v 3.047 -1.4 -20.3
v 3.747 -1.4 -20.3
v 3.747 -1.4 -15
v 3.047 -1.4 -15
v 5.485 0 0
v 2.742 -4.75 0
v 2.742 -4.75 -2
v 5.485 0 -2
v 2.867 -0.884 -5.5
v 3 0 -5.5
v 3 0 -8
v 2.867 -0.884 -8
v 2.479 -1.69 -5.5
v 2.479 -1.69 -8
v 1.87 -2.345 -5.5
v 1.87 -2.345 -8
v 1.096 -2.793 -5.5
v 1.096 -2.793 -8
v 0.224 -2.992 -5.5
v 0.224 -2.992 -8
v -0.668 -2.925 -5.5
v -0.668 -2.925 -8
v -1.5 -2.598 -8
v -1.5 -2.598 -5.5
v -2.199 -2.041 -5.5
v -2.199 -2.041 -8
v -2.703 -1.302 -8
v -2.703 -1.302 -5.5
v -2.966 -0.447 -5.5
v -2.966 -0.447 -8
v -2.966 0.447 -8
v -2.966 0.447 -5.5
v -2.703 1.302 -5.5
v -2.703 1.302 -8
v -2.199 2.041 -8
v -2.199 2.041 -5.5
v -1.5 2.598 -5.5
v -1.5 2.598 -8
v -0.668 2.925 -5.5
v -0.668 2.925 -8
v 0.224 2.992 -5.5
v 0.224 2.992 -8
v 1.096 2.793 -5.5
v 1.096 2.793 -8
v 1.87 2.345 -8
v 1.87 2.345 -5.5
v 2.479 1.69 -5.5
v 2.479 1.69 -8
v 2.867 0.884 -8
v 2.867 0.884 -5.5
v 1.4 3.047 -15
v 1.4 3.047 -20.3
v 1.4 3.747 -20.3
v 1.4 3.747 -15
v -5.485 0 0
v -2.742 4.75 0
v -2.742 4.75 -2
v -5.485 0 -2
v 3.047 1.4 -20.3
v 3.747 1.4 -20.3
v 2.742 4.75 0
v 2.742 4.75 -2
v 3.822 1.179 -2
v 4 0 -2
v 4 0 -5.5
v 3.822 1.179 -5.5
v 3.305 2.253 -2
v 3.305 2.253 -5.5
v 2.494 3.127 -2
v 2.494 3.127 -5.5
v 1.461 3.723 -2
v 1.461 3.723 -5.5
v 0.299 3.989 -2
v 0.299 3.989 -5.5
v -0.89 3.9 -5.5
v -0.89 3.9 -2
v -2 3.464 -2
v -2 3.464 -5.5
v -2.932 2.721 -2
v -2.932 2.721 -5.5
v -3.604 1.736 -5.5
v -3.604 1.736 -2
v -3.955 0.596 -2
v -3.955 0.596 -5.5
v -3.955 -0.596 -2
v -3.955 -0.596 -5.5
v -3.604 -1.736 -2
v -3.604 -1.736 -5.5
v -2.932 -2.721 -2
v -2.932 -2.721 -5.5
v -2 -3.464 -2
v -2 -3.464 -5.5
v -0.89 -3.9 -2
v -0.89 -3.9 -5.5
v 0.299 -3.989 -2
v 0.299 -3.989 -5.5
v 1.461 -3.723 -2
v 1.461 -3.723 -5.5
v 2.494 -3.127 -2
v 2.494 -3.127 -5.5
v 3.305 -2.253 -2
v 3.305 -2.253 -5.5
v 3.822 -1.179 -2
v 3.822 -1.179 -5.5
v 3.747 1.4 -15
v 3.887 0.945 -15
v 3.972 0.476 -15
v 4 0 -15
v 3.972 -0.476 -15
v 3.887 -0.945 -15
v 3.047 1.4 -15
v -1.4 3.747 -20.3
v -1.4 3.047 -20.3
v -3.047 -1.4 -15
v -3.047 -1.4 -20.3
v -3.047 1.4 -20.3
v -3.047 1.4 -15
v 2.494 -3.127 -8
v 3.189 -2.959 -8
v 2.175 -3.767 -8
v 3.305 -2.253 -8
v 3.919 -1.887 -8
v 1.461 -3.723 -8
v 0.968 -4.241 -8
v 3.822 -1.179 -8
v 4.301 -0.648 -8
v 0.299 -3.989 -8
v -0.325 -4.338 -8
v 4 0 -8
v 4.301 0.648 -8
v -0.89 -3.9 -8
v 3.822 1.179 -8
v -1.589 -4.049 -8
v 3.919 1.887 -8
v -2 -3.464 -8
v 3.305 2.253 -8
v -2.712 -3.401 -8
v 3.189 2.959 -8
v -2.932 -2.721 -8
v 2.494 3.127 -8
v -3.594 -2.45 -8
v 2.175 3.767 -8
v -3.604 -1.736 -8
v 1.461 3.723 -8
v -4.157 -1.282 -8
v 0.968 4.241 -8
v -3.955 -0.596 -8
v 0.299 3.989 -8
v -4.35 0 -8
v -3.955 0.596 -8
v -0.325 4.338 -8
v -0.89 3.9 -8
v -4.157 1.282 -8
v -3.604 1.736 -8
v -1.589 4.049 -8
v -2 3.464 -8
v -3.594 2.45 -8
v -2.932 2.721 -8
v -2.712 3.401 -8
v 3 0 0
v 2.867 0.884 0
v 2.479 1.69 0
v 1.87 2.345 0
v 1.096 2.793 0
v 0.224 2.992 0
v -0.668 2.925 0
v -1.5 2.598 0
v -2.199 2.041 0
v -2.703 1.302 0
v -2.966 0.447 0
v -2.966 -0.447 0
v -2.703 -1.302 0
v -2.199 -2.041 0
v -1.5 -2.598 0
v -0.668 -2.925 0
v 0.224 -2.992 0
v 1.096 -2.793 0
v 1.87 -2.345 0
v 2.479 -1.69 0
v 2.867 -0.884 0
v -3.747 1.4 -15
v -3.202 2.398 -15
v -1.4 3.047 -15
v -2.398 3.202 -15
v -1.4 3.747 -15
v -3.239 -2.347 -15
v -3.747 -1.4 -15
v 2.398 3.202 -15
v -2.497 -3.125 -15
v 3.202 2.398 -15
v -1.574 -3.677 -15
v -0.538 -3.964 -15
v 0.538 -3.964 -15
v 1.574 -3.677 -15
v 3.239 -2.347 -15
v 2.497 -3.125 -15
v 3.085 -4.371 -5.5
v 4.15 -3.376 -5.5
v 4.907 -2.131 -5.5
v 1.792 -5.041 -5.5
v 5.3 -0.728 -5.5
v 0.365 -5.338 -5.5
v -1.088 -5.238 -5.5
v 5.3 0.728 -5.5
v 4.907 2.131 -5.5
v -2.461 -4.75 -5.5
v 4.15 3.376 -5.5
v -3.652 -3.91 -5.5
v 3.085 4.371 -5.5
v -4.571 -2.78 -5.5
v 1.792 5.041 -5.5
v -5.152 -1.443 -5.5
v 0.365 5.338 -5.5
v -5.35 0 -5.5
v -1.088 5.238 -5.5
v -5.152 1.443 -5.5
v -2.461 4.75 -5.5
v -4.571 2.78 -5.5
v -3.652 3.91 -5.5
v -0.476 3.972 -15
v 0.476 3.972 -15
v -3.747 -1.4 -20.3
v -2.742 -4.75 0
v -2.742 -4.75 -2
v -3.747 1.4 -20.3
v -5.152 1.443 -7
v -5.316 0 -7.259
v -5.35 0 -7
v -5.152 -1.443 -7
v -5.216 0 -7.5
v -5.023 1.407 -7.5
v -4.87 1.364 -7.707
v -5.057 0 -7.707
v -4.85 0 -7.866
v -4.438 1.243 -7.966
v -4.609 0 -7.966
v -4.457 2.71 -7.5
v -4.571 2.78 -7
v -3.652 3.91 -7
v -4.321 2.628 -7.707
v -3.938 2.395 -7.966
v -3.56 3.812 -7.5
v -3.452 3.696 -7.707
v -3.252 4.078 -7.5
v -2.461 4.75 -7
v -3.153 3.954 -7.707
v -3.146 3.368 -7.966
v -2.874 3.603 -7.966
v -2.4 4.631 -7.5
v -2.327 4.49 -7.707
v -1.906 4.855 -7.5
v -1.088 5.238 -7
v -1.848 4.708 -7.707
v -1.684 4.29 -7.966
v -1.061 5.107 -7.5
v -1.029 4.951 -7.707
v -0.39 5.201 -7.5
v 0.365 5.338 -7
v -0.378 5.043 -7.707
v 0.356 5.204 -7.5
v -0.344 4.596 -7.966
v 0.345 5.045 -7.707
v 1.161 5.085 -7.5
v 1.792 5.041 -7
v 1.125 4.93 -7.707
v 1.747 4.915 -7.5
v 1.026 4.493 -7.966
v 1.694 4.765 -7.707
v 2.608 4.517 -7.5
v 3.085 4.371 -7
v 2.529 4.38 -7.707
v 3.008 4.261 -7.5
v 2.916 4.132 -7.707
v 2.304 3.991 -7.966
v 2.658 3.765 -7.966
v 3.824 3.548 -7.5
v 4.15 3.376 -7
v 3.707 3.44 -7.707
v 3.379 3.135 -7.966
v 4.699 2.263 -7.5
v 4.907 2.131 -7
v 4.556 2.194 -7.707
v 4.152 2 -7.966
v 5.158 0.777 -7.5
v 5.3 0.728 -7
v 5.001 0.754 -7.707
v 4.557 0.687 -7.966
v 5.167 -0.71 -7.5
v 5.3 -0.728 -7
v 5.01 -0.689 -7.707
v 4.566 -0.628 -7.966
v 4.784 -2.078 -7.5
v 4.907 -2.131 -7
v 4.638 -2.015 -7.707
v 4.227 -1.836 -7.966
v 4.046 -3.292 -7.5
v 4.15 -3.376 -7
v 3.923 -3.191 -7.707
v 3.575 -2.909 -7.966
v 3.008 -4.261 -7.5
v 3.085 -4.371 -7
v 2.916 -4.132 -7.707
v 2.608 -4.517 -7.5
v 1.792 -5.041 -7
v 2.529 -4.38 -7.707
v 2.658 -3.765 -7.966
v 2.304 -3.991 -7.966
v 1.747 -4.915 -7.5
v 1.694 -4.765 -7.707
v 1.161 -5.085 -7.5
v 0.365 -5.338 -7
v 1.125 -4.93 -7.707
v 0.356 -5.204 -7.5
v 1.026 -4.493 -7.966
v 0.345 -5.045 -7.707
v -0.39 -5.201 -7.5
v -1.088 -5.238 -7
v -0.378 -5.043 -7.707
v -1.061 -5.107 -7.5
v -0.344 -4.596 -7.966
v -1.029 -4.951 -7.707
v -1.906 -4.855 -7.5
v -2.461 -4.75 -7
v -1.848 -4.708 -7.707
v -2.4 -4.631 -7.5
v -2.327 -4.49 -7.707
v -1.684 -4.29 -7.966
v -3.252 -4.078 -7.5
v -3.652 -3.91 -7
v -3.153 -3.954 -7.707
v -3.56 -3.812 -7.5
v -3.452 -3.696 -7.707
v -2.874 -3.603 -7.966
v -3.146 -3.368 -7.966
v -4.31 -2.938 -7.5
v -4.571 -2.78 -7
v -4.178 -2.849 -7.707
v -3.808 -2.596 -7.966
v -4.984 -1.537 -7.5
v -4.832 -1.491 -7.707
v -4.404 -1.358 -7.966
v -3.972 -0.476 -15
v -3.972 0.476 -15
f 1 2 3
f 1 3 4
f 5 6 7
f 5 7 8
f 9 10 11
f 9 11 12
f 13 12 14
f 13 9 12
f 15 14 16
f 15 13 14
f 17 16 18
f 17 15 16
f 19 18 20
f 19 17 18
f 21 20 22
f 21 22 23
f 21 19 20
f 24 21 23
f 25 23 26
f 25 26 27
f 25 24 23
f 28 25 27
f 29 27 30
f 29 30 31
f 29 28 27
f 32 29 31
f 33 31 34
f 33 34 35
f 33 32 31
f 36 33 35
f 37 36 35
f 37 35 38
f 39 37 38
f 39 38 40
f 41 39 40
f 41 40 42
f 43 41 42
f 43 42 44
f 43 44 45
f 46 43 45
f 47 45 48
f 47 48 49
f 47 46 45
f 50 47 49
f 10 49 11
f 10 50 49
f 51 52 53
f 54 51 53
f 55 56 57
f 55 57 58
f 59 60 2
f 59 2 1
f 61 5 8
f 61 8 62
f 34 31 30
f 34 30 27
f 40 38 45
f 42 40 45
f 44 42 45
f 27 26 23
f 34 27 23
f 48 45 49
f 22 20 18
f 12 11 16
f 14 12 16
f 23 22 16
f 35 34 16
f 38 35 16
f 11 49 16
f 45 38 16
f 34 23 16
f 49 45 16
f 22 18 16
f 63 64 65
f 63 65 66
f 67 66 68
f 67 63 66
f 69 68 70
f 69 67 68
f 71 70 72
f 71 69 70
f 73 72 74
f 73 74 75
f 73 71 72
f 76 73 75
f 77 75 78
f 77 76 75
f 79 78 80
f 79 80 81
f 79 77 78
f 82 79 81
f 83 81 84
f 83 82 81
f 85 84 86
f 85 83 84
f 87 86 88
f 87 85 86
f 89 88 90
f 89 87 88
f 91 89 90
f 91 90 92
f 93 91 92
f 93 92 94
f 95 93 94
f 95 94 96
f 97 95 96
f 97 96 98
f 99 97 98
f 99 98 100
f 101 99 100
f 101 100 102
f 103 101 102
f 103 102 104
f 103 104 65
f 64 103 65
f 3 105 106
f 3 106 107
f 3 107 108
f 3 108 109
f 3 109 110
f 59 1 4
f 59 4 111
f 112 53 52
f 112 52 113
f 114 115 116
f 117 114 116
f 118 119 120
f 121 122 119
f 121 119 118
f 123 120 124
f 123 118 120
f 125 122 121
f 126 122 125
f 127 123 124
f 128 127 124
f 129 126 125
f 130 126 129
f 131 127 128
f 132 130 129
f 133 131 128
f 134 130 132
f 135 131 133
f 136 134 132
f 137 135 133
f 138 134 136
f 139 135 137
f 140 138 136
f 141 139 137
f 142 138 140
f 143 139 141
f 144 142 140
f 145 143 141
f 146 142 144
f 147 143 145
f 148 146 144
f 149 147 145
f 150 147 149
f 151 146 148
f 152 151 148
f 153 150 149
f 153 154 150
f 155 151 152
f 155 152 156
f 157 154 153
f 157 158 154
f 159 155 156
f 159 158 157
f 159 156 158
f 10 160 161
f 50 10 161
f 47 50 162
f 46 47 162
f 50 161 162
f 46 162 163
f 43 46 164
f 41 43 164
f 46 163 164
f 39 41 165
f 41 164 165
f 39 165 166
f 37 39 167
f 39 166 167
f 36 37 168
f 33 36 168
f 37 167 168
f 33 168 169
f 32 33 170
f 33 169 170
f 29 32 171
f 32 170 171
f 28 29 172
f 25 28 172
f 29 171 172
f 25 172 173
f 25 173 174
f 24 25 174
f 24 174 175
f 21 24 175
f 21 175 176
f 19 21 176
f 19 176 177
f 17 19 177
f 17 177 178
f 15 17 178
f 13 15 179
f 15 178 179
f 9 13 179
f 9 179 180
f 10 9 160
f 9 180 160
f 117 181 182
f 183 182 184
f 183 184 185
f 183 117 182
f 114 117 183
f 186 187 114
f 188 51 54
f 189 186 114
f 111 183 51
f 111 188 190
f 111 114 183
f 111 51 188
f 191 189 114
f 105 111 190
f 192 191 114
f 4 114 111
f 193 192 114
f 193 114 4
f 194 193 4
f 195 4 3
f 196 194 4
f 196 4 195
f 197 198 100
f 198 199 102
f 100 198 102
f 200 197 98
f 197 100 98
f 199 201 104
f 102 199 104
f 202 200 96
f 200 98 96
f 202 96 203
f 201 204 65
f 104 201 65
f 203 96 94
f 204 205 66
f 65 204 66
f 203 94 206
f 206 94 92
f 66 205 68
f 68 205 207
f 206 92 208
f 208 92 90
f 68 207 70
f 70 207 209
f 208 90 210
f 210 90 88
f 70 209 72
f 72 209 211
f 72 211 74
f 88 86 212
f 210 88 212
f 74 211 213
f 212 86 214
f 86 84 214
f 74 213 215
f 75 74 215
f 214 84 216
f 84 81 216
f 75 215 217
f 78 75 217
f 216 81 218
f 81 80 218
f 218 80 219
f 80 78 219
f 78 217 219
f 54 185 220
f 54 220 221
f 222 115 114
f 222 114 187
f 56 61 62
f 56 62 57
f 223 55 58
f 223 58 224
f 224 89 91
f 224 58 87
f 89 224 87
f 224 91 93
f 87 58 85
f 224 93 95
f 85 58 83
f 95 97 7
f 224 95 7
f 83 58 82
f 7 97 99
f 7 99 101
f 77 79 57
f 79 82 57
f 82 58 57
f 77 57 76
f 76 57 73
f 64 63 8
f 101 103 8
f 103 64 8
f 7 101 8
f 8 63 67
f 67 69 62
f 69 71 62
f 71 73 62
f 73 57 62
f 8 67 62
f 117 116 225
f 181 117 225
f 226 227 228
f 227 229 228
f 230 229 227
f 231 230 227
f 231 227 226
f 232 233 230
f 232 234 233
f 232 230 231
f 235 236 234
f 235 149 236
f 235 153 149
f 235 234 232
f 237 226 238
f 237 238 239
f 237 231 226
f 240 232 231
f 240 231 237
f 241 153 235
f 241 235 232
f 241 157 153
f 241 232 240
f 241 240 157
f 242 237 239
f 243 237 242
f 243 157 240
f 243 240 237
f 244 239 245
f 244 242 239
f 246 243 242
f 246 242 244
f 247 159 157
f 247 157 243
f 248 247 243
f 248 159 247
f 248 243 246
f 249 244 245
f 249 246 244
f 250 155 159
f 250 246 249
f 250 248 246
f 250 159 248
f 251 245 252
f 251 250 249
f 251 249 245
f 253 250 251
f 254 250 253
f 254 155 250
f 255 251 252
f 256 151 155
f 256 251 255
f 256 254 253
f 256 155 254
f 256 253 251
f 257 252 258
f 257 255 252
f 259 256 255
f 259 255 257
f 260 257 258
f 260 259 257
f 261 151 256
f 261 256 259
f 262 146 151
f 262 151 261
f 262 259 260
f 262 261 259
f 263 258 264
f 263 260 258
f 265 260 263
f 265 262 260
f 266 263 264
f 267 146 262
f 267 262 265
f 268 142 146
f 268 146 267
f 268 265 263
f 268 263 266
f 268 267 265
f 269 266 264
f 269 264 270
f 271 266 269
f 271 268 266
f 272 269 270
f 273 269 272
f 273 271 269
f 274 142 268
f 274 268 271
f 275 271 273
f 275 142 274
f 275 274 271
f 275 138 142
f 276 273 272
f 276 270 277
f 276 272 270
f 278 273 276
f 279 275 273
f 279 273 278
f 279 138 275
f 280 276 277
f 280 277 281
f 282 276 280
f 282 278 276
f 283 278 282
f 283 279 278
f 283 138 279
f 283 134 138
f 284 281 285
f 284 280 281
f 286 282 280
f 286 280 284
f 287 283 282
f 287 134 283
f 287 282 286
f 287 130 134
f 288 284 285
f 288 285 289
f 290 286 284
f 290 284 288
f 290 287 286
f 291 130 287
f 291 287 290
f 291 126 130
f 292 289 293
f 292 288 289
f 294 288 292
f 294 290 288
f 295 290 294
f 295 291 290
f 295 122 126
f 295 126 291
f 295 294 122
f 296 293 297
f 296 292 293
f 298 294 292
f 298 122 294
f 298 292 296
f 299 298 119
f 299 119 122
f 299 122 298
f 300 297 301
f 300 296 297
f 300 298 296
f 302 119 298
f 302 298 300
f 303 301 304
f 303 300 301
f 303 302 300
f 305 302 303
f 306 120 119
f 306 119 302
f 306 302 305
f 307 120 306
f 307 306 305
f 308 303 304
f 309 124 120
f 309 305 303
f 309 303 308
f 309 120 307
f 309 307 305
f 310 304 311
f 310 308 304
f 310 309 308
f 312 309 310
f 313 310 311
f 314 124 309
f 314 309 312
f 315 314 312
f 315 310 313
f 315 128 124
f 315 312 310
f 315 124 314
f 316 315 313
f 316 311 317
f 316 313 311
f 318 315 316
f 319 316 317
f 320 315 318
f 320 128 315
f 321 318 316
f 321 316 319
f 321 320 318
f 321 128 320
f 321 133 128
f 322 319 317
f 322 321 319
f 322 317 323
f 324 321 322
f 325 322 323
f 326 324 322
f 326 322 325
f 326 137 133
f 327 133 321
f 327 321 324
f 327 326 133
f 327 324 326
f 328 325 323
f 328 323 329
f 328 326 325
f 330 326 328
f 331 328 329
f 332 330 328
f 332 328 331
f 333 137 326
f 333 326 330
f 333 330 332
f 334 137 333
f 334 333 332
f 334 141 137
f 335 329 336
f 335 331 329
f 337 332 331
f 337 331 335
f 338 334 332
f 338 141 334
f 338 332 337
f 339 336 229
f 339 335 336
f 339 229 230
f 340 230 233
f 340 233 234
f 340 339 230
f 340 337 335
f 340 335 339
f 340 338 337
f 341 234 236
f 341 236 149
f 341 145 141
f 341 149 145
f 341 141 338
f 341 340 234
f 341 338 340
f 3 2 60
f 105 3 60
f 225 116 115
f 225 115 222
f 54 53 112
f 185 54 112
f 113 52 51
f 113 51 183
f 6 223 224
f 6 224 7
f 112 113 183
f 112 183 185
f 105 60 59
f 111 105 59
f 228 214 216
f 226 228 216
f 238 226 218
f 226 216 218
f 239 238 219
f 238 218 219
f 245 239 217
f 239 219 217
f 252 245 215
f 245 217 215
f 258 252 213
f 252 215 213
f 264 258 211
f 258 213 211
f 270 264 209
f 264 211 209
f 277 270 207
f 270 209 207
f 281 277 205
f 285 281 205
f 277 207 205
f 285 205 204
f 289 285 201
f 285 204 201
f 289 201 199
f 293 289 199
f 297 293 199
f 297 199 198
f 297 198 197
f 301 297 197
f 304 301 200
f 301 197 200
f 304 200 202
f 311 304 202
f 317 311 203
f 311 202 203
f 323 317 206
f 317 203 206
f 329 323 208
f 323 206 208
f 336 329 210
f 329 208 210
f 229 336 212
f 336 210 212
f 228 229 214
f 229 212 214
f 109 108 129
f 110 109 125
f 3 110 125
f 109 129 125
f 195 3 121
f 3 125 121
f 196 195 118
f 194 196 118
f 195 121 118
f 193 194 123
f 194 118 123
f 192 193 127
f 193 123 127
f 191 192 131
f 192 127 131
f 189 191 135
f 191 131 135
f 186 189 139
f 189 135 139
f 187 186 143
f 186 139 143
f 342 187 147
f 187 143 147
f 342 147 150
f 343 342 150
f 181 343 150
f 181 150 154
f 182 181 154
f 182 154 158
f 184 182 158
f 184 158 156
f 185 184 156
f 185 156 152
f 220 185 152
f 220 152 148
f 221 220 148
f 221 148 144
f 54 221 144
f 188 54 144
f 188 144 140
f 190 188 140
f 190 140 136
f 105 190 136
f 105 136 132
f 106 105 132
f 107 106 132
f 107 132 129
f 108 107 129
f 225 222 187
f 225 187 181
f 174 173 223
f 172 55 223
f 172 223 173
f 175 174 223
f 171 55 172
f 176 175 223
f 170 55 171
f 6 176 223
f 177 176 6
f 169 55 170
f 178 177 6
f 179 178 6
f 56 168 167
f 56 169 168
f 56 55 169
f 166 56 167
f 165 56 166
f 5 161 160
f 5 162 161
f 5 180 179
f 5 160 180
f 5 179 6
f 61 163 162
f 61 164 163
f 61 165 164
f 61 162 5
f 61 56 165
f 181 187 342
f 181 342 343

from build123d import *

# Parameters (mm, degrees)
CROQUIS1_R              = 4
CROQUIS1_R_2            = 3
SALIENTE_EXTRUIR1_DEPTH = 5.5
CROQUIS2_R              = 5.35
CROQUIS2_R_2            = 3
SALIENTE_EXTRUIR2_DEPTH = 2.5
REDONDEO1_R             = 1
CROQUIS3_R              = 4
SALIENTE_EXTRUIR3_DEPTH = 7
CROQUIS4_W              = 2.8
CROQUIS4_H              = 0.7
CROQUIS4_W_2            = 0.7
CROQUIS4_H_2            = 2.8
SALIENTE_EXTRUIR4_DEPTH = 5.3
CROQUIS5_R              = 4
SALIENTE_EXTRUIR5_DEPTH = 2


with BuildPart() as part:
    # Croquis1 → Saliente-Extruir1 (new body)
    with BuildSketch(Plane.XY):
        Circle(CROQUIS1_R)
        Circle(CROQUIS1_R_2, mode=Mode.SUBTRACT)
    extrude(amount=-SALIENTE_EXTRUIR1_DEPTH)

    # Croquis2 → Saliente-Extruir2 (add)
    with BuildSketch(Plane(origin=(0, 0, -5.5), x_dir=(-1, 0, 0), z_dir=(0, 0, -1))):
        Circle(CROQUIS2_R)
        with Locations(Location((0, 0, 0), (0, 0, 180))):
            Circle(CROQUIS2_R_2, mode=Mode.SUBTRACT)
    extrude(amount=SALIENTE_EXTRUIR2_DEPTH)

    # Redondeo1
    redondeo1_edges = [part.edges().sort_by_distance(p)[0] for p in [
        (5.35, 0, -8),
    ]]
    fillet(redondeo1_edges, radius=REDONDEO1_R)

    # Croquis3 → Saliente-Extruir3 (add)
    with BuildSketch(Plane(origin=(0, 0, -8), x_dir=(-1, 0, 0), z_dir=(0, 0, -1))):
        with Locations(Location((0, 0, 0), (0, 0, 180))):
            Circle(CROQUIS3_R)
    extrude(amount=SALIENTE_EXTRUIR3_DEPTH)

    # Croquis4 → Saliente-Extruir4 (add)
    with BuildSketch(Plane(origin=(0, 0, -15), x_dir=(-1, 0, 0), z_dir=(0, 0, -1))):
        with Locations((0, 3.396998799)):
            Rectangle(CROQUIS4_W, CROQUIS4_H)
        with Locations((-3.396998799, 0)):
            Rectangle(CROQUIS4_W_2, CROQUIS4_H_2)
        with Locations((3.396998799, 0)):
            Rectangle(CROQUIS4_W_2, CROQUIS4_H_2)
    extrude(amount=SALIENTE_EXTRUIR4_DEPTH)

    # Croquis5 → Saliente-Extruir5 (add)
    with BuildSketch(Plane.XY):
        Polygon((5.484827557, 0), (2.742413779, 4.75), (-2.742413779, 4.75), (-5.484827557, 0), (-2.742413779, -4.75), (2.742413779, -4.75), align=None)
        Circle(CROQUIS5_R, mode=Mode.SUBTRACT)
    extrude(amount=-SALIENTE_EXTRUIR5_DEPTH)


solid = part.part
